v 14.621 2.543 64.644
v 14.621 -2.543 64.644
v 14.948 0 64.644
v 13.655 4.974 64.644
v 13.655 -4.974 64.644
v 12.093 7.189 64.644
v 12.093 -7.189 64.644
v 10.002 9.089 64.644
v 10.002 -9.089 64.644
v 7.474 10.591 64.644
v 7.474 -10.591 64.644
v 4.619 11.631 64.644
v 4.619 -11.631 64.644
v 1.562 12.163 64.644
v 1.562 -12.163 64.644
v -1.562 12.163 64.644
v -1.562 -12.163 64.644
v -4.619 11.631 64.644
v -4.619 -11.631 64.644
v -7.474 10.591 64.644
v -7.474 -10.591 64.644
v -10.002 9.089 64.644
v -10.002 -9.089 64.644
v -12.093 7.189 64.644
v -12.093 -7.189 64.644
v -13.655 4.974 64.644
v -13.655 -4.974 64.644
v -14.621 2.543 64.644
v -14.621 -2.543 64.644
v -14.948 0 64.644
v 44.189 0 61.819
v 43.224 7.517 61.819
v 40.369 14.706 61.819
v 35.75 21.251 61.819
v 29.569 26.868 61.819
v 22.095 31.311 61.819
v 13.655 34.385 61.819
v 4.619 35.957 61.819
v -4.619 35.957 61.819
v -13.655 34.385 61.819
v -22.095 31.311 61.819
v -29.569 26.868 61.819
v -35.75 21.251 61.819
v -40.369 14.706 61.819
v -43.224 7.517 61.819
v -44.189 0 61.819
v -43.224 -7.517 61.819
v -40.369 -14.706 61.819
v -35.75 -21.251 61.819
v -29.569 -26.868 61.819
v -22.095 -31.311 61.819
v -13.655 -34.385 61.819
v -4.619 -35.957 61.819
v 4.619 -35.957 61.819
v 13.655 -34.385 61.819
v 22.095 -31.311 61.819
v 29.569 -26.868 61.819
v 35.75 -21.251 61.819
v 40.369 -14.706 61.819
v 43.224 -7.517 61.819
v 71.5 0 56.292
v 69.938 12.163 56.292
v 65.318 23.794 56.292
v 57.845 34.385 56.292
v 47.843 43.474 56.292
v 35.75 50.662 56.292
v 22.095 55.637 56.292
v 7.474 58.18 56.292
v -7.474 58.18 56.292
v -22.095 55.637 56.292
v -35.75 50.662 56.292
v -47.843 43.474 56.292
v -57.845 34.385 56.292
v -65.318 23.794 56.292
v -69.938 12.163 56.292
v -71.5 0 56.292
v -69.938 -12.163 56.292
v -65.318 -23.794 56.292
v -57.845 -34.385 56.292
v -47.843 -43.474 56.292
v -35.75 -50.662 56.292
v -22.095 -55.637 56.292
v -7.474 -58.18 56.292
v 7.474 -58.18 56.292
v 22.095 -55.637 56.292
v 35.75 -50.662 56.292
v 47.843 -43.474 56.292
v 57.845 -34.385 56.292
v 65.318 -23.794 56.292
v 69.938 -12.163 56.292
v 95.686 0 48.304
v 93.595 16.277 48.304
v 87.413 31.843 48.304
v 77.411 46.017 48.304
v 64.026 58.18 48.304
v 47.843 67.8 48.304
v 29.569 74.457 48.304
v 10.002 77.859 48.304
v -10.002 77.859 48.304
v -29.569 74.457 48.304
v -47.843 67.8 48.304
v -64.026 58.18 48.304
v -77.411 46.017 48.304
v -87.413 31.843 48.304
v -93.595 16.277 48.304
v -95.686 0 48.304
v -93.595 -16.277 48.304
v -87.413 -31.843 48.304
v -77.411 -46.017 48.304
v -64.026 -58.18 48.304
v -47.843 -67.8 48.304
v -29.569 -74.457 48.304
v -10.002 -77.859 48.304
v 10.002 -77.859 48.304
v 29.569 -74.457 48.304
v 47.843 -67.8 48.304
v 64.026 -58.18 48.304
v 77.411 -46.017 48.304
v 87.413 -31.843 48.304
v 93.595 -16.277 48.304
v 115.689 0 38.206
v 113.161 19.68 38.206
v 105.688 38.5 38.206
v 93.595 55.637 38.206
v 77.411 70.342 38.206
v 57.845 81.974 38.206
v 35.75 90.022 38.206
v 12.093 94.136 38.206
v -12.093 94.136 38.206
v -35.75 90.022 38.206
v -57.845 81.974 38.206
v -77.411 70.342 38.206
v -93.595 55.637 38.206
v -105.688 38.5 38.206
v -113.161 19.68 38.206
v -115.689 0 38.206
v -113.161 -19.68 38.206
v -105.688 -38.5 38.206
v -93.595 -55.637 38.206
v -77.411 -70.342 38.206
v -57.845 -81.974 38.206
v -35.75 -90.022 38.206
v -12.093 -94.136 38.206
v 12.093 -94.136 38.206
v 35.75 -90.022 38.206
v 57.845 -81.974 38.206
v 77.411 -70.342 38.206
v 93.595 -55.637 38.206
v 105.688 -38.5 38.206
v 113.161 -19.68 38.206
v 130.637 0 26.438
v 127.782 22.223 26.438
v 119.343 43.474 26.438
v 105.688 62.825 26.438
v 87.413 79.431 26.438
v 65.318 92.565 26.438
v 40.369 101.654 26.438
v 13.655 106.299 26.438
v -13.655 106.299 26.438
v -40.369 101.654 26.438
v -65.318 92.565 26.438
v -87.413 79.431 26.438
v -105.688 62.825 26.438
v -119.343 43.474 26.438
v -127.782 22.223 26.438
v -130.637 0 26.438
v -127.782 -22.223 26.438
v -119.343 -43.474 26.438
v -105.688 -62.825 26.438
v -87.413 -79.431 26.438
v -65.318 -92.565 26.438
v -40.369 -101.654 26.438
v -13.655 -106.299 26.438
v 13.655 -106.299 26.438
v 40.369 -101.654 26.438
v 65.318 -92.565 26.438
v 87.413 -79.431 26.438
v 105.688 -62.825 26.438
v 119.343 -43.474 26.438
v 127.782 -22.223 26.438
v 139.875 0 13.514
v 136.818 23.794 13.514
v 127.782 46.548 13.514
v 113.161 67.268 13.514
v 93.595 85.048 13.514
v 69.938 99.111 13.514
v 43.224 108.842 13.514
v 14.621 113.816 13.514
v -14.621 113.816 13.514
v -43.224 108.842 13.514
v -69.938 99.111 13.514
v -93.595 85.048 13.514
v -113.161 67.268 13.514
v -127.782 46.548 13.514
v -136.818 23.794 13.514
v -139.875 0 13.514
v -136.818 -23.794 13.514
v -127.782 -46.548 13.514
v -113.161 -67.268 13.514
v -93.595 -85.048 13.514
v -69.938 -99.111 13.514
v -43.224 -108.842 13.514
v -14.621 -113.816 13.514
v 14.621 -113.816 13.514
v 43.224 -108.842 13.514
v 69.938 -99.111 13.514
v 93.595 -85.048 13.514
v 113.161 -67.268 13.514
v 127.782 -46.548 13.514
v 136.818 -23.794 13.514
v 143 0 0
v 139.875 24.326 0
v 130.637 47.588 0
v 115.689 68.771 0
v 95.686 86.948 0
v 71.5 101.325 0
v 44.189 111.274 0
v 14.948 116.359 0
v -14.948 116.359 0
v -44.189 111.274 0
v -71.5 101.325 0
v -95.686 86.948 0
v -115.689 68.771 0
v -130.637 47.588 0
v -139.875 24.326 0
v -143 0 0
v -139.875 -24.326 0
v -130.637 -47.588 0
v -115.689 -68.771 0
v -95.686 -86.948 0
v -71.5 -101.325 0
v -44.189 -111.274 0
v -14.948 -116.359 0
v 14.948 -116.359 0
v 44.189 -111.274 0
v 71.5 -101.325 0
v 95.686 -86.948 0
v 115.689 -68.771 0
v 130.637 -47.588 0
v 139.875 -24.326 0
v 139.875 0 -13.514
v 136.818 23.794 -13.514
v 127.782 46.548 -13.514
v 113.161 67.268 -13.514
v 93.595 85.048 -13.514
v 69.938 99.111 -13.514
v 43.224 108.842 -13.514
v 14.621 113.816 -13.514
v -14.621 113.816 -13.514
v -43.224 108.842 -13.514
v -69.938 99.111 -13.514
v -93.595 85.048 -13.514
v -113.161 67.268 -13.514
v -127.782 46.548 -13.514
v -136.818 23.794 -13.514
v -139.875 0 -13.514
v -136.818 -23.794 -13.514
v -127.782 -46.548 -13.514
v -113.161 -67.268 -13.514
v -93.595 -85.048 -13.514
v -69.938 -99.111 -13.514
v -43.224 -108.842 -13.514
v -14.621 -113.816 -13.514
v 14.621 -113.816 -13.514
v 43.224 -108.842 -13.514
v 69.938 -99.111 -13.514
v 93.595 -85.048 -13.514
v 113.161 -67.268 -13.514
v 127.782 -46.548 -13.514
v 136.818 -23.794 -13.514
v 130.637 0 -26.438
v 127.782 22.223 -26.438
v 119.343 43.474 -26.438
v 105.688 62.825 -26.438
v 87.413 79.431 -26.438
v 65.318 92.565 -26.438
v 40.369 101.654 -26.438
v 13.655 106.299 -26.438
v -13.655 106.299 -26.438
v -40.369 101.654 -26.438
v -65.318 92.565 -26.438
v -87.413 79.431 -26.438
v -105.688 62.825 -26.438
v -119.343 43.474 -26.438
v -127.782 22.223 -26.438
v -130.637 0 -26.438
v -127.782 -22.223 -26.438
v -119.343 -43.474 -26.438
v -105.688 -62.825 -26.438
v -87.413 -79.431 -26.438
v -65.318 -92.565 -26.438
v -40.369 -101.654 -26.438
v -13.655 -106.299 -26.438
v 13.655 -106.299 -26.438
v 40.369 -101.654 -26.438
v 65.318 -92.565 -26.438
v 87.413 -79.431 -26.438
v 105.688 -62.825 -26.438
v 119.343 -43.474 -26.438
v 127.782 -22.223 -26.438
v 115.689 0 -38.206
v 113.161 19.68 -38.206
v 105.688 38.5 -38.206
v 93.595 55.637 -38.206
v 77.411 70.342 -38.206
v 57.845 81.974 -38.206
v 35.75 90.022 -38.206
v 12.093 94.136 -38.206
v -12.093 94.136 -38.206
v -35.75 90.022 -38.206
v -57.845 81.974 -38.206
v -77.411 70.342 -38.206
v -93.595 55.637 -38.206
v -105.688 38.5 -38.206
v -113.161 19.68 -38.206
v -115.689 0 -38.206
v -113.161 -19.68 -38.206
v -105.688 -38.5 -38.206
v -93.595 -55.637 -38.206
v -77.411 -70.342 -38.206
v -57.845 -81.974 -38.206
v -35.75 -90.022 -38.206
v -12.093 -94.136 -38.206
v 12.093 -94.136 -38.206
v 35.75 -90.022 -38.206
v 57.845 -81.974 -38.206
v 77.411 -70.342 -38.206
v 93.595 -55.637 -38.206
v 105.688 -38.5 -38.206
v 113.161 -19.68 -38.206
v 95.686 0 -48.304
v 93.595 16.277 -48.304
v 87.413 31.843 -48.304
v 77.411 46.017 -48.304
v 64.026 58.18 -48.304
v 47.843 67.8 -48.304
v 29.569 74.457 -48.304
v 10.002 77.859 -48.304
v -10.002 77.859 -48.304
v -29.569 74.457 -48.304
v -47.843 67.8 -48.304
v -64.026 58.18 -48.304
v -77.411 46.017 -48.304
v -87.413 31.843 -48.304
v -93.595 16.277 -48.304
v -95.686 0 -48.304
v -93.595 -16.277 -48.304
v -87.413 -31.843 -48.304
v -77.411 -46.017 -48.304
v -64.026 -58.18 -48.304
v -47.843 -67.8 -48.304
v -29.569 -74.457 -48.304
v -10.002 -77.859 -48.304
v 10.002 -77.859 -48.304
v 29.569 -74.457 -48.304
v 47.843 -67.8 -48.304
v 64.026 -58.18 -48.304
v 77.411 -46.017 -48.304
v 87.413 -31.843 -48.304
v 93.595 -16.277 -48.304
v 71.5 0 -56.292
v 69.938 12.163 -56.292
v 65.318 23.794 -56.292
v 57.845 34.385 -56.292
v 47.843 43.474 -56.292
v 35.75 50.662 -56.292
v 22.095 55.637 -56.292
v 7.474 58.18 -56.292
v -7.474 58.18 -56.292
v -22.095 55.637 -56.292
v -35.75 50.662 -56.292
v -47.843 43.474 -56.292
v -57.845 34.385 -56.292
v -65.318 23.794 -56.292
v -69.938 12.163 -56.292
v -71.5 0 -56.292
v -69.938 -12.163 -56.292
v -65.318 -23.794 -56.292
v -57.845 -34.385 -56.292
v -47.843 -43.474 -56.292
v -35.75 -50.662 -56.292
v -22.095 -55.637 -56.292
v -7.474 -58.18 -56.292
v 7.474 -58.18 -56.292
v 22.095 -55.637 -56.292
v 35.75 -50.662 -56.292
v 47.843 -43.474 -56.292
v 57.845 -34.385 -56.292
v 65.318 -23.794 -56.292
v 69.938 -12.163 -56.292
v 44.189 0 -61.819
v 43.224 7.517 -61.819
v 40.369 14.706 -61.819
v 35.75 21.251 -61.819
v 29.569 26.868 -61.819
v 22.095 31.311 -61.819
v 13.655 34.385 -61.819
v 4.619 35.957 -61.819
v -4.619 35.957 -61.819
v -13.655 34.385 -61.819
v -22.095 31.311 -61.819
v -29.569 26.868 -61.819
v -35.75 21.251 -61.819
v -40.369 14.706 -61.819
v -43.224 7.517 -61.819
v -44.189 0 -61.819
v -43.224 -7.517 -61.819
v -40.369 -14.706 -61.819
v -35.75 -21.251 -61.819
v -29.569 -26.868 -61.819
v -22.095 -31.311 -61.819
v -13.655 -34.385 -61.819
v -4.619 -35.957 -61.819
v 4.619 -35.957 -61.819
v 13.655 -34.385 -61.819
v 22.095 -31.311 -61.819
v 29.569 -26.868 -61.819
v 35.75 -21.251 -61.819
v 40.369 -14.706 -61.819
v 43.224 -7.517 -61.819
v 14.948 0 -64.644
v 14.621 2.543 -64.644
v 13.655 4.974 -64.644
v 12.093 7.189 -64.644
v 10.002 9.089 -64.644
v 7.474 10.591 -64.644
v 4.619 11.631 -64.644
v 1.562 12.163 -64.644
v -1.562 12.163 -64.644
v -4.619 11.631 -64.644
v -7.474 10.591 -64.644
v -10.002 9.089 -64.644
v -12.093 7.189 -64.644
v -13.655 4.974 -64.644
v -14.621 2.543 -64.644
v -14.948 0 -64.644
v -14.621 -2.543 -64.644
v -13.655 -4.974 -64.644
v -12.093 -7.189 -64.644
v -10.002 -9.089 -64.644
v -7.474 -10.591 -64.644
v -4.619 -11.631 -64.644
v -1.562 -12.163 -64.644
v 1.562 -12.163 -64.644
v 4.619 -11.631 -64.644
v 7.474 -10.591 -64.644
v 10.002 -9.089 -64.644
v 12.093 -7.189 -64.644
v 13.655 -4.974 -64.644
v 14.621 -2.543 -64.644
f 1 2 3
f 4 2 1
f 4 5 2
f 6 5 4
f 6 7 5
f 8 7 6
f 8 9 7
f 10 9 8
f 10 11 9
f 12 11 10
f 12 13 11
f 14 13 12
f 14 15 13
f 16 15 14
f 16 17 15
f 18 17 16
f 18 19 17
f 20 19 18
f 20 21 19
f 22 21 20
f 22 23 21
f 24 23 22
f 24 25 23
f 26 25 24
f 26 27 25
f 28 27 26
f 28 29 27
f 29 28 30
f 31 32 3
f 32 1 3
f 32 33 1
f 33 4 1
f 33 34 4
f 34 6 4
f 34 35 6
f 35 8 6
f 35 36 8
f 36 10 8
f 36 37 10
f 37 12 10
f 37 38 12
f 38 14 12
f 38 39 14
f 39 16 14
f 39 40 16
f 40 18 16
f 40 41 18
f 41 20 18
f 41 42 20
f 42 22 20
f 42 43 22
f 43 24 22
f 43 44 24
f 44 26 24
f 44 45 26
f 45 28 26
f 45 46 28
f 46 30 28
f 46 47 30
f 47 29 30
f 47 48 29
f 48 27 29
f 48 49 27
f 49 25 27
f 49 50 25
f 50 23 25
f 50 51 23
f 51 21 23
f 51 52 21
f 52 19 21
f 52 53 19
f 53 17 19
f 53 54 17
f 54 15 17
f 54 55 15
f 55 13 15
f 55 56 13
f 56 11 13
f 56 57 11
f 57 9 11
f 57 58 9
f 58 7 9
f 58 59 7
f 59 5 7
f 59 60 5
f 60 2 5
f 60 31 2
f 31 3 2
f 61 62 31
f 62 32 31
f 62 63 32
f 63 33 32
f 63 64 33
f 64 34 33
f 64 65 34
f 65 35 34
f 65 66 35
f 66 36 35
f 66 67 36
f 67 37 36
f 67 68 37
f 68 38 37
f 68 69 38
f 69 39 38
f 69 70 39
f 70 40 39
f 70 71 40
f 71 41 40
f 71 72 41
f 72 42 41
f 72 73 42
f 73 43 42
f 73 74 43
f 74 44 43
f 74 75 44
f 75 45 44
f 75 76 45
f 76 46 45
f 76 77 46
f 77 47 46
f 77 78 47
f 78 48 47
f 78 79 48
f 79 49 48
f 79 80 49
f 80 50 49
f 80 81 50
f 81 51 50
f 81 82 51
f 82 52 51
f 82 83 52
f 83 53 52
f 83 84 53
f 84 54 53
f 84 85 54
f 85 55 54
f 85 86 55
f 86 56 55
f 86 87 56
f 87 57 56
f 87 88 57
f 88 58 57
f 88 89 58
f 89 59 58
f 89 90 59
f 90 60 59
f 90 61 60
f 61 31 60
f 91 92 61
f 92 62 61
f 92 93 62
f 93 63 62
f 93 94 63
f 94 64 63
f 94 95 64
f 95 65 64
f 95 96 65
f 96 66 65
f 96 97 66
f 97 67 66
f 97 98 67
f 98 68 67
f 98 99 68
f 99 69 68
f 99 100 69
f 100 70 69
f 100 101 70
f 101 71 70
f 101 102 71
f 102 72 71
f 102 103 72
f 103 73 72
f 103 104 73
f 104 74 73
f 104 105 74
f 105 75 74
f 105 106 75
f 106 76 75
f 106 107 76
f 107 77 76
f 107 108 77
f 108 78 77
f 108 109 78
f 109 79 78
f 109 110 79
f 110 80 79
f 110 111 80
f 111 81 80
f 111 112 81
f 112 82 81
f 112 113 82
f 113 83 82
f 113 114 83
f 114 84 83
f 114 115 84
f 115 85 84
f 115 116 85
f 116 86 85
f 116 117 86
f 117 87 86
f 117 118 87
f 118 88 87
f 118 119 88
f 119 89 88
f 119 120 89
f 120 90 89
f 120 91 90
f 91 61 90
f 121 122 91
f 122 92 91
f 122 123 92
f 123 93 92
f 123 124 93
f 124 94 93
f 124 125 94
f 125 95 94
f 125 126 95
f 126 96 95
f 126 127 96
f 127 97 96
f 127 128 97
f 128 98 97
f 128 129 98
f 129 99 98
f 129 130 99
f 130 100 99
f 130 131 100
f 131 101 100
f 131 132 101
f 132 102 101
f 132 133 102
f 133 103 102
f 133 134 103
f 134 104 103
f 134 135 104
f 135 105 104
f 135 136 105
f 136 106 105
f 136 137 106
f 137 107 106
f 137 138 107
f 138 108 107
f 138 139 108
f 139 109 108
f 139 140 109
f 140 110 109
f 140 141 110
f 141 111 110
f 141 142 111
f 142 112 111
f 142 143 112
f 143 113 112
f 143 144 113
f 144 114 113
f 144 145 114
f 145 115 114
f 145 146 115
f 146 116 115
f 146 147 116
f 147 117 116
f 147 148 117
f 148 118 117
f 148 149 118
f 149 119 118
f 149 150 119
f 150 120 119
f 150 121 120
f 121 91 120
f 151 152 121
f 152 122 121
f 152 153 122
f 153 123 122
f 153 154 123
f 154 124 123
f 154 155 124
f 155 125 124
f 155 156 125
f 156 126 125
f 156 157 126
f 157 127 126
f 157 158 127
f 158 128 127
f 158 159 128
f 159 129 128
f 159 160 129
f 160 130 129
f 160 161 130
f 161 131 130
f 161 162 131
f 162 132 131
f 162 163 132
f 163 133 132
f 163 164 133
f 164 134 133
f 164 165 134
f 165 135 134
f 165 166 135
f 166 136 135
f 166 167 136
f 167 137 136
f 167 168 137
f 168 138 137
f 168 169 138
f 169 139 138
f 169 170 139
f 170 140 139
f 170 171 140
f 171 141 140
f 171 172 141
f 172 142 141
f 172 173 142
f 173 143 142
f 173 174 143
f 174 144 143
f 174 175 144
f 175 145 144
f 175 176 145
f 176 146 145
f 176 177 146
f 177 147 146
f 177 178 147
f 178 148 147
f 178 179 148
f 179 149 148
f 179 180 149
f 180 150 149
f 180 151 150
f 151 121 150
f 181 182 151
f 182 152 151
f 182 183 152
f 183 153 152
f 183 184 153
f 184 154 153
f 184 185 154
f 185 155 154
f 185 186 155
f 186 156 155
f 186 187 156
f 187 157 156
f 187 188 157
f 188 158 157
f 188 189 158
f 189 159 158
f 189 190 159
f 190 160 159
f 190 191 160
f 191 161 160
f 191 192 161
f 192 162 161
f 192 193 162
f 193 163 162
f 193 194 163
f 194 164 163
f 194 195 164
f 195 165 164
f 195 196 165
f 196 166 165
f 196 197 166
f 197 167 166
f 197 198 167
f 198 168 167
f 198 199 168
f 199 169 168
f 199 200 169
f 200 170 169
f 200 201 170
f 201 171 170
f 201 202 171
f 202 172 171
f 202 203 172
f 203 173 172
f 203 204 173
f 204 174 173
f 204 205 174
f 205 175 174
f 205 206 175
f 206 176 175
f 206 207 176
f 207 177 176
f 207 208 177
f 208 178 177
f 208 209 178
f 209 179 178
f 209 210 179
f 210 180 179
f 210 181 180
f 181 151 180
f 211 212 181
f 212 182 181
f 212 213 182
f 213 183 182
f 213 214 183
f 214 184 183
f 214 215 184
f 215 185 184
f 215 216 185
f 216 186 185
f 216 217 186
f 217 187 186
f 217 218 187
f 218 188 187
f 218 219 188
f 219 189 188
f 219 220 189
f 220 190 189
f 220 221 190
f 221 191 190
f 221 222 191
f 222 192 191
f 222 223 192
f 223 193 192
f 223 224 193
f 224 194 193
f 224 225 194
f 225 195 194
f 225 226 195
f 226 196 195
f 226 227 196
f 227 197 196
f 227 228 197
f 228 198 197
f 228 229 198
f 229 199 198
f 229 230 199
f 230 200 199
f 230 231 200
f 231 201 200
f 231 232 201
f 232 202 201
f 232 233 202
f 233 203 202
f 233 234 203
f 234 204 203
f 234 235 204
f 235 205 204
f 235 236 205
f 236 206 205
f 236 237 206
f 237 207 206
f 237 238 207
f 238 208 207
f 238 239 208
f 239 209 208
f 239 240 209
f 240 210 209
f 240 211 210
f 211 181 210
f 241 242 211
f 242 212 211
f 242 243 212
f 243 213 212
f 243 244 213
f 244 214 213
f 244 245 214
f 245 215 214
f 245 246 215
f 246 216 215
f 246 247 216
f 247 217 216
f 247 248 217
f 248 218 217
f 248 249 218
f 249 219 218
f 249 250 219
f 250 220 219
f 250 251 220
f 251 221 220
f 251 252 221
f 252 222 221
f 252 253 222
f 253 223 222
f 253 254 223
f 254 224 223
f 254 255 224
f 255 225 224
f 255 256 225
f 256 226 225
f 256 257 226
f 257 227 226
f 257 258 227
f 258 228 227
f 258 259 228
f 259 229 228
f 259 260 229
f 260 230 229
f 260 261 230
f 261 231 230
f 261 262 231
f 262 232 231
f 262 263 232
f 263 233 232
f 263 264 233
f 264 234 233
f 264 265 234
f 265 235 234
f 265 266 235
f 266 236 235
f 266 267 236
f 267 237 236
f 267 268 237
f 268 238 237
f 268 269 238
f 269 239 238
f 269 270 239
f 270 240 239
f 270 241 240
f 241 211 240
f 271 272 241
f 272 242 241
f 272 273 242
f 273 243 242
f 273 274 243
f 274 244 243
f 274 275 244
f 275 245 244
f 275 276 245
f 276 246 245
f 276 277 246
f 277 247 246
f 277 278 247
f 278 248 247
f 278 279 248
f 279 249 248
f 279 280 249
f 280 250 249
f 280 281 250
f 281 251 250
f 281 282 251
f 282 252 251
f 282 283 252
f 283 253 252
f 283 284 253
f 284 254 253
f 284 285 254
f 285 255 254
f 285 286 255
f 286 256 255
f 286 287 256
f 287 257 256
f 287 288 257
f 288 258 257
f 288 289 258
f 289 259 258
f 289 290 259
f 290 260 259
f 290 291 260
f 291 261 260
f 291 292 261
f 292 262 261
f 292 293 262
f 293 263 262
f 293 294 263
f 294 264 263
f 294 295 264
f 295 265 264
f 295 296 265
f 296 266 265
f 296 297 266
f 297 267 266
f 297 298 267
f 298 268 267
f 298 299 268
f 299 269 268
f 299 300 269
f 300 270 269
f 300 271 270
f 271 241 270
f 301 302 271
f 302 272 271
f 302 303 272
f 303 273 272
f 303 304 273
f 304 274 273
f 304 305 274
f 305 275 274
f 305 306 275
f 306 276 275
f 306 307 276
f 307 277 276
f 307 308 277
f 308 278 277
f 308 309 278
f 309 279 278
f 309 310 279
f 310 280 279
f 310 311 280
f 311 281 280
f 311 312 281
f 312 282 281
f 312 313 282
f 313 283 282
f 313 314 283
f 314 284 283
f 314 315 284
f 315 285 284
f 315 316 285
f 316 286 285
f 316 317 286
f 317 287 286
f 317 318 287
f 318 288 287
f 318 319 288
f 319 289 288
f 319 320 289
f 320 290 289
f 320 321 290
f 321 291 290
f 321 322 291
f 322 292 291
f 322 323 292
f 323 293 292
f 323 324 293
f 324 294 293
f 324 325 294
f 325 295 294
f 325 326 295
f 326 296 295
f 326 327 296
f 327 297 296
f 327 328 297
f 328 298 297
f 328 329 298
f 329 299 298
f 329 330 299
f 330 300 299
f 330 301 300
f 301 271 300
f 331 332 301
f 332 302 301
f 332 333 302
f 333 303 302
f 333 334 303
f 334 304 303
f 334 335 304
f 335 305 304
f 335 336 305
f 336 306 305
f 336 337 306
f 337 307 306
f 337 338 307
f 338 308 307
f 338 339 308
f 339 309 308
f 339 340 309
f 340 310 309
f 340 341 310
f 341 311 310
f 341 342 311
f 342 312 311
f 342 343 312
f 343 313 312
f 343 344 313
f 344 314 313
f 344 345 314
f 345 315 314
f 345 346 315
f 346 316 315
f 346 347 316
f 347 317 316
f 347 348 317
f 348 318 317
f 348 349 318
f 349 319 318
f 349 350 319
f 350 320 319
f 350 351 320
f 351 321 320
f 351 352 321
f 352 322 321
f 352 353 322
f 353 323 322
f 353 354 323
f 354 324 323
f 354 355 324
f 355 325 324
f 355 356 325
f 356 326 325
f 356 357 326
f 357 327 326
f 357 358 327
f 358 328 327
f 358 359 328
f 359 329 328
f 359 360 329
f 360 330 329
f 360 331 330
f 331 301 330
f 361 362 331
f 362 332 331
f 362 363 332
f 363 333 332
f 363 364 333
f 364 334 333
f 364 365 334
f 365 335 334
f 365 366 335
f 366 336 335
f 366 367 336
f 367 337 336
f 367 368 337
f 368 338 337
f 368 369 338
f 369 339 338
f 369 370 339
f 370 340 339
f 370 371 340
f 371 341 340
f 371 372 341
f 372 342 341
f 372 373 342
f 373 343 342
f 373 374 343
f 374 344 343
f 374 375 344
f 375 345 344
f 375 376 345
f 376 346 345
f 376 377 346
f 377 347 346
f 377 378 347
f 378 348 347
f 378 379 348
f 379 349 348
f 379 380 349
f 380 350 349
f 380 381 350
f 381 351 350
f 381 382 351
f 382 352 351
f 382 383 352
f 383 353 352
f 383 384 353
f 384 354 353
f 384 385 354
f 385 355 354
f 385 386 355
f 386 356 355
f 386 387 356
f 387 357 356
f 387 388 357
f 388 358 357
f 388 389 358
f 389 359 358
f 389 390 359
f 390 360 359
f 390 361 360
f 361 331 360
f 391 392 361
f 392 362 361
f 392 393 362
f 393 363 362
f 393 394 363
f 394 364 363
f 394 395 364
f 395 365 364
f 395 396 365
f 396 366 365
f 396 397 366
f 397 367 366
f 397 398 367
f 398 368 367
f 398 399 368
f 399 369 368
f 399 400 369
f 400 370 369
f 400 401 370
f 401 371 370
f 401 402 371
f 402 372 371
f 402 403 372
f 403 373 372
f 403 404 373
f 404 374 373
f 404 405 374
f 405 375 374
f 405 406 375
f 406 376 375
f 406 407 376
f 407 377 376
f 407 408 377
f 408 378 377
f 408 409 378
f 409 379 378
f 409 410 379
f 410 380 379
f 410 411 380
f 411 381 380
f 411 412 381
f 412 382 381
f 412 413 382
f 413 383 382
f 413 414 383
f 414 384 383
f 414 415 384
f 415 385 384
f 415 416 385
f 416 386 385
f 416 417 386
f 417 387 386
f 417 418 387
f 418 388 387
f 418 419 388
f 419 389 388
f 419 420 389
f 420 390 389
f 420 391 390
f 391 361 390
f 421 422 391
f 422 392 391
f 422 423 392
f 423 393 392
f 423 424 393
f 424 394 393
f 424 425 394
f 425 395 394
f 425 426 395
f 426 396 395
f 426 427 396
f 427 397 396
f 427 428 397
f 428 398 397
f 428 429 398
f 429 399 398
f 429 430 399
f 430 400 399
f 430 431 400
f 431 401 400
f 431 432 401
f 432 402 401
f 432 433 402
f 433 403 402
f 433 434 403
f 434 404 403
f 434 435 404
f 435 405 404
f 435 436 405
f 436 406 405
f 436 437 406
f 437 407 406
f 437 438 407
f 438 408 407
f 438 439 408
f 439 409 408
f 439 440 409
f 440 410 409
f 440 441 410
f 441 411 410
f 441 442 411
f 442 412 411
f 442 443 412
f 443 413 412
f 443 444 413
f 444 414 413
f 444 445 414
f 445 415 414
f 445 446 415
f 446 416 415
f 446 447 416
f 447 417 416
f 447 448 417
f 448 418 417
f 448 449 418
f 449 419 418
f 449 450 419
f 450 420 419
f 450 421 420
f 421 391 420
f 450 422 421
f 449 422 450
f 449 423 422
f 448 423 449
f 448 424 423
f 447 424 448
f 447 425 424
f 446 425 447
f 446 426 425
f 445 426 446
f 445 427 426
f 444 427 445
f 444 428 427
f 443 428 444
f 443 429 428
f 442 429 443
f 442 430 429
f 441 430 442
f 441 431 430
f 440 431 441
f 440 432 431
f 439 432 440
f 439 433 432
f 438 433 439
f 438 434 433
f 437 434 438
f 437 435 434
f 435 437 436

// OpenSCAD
// Generated by SolidPython 1.0.1 on 2020-07-29 00:46:49


scale(v = [11, 9, 5]) {
	sphere(r = 13);
}
/***********************************************
*********      SolidPython code:      **********
************************************************
 
# import packages: SolidPython
from solid import *
from solid.utils import *
from itertools import chain, combinations, permutations


class Resize:

    def __init__(self, scad_file):
        self.scad_file = scad_file
        #self.scad_file = import_scad(scad_file)
        # cone/cylinder param:
        self.r1 = 0
        self.r2 = 0
        self.h = 0
        # rectangular prism param:
        self.w = 0
        self.l = 0
        # ellipse param:
        self.r = 0

    # import OpenScad code (file name corresponds to shape)


    # classify shape + parameters
    def assign(self, param1, param2, param3):
        if self.scad_file == 'cone.scad':
            self.r1 = param1
            self.r2 = param2
            self.h = param3
        elif self.scad_file == 'cylinder.scad':
            self.r1 = param1
            self.r2 = param2
            self.h = param3
        elif self.scad_file == 'rectangularPrism.scad':
            self.h = param1
            self.l = param2
            self.w = param3
        else:
            self.r = param1
            self.h = param2

    # resize parameters
    def iterate(self):
        x = range(3, 20, 2)
        i = 1
        if self.scad_file == 'cone.scad':
            tempList = list(permutations(x, 2))
            for temp in tempList:
                param1 = temp[0]
                param2 = temp[1]
                filepath = 'produced_scad_files/' + 'cone' + str(param1) + '_' + str(param2) + '_' + '.scad'
                scad_render_to_file(cylinder(h=param1, r1=param2, r2=0), filepath)

        elif self.scad_file == 'cylinder.scad':
            tempList = list(permutations(x, 3))
            for temp in tempList:
                param1 = temp[0]
                param2 = temp[1]
                filepath = 'produced_scad_files/' + 'cylinder' + str(param1) + '_' + str(param2) + '_' + '.scad'
                scad_render_to_file(cylinder(h=param1, r1=param2, r2=param2), filepath)

        elif self.scad_file == 'rectangularPrism.scad':
            tempList = list(permutations(x, 3))
            for temp in tempList:
                param1 = temp[0]
                param2 = temp[1]
                param3 = temp[2]
                filepath = 'produced_scad_files/' + 'rectangularPrism' + str(param1) + '_' + str(param2) + '_' + str(
                    param3) + '.scad'
                scad_render_to_file(cube(size=(param1, param2, param3)), filepath)

        elif self.scad_file == 'ellipse.scad':
            tempList = list(permutations(x, 4))
            for temp in tempList:
                param1 = temp[0]
                param2 = temp[1]
                param3 = temp[2]
                param4 = temp[3]
                filepath = 'produced_scad_files/' + 'ellipse' + str(param1) + '_' + str(param2) + '_' + str(param3) + '_' + str(param4) + '.scad'
                scad_render_to_file(scale([param1, param2, param3])(sphere(r=param4)), filepath)

    def render_to_scadfile(self):
        scad_render_to_file(scad, 'example.scad') 
 
************************************************/
